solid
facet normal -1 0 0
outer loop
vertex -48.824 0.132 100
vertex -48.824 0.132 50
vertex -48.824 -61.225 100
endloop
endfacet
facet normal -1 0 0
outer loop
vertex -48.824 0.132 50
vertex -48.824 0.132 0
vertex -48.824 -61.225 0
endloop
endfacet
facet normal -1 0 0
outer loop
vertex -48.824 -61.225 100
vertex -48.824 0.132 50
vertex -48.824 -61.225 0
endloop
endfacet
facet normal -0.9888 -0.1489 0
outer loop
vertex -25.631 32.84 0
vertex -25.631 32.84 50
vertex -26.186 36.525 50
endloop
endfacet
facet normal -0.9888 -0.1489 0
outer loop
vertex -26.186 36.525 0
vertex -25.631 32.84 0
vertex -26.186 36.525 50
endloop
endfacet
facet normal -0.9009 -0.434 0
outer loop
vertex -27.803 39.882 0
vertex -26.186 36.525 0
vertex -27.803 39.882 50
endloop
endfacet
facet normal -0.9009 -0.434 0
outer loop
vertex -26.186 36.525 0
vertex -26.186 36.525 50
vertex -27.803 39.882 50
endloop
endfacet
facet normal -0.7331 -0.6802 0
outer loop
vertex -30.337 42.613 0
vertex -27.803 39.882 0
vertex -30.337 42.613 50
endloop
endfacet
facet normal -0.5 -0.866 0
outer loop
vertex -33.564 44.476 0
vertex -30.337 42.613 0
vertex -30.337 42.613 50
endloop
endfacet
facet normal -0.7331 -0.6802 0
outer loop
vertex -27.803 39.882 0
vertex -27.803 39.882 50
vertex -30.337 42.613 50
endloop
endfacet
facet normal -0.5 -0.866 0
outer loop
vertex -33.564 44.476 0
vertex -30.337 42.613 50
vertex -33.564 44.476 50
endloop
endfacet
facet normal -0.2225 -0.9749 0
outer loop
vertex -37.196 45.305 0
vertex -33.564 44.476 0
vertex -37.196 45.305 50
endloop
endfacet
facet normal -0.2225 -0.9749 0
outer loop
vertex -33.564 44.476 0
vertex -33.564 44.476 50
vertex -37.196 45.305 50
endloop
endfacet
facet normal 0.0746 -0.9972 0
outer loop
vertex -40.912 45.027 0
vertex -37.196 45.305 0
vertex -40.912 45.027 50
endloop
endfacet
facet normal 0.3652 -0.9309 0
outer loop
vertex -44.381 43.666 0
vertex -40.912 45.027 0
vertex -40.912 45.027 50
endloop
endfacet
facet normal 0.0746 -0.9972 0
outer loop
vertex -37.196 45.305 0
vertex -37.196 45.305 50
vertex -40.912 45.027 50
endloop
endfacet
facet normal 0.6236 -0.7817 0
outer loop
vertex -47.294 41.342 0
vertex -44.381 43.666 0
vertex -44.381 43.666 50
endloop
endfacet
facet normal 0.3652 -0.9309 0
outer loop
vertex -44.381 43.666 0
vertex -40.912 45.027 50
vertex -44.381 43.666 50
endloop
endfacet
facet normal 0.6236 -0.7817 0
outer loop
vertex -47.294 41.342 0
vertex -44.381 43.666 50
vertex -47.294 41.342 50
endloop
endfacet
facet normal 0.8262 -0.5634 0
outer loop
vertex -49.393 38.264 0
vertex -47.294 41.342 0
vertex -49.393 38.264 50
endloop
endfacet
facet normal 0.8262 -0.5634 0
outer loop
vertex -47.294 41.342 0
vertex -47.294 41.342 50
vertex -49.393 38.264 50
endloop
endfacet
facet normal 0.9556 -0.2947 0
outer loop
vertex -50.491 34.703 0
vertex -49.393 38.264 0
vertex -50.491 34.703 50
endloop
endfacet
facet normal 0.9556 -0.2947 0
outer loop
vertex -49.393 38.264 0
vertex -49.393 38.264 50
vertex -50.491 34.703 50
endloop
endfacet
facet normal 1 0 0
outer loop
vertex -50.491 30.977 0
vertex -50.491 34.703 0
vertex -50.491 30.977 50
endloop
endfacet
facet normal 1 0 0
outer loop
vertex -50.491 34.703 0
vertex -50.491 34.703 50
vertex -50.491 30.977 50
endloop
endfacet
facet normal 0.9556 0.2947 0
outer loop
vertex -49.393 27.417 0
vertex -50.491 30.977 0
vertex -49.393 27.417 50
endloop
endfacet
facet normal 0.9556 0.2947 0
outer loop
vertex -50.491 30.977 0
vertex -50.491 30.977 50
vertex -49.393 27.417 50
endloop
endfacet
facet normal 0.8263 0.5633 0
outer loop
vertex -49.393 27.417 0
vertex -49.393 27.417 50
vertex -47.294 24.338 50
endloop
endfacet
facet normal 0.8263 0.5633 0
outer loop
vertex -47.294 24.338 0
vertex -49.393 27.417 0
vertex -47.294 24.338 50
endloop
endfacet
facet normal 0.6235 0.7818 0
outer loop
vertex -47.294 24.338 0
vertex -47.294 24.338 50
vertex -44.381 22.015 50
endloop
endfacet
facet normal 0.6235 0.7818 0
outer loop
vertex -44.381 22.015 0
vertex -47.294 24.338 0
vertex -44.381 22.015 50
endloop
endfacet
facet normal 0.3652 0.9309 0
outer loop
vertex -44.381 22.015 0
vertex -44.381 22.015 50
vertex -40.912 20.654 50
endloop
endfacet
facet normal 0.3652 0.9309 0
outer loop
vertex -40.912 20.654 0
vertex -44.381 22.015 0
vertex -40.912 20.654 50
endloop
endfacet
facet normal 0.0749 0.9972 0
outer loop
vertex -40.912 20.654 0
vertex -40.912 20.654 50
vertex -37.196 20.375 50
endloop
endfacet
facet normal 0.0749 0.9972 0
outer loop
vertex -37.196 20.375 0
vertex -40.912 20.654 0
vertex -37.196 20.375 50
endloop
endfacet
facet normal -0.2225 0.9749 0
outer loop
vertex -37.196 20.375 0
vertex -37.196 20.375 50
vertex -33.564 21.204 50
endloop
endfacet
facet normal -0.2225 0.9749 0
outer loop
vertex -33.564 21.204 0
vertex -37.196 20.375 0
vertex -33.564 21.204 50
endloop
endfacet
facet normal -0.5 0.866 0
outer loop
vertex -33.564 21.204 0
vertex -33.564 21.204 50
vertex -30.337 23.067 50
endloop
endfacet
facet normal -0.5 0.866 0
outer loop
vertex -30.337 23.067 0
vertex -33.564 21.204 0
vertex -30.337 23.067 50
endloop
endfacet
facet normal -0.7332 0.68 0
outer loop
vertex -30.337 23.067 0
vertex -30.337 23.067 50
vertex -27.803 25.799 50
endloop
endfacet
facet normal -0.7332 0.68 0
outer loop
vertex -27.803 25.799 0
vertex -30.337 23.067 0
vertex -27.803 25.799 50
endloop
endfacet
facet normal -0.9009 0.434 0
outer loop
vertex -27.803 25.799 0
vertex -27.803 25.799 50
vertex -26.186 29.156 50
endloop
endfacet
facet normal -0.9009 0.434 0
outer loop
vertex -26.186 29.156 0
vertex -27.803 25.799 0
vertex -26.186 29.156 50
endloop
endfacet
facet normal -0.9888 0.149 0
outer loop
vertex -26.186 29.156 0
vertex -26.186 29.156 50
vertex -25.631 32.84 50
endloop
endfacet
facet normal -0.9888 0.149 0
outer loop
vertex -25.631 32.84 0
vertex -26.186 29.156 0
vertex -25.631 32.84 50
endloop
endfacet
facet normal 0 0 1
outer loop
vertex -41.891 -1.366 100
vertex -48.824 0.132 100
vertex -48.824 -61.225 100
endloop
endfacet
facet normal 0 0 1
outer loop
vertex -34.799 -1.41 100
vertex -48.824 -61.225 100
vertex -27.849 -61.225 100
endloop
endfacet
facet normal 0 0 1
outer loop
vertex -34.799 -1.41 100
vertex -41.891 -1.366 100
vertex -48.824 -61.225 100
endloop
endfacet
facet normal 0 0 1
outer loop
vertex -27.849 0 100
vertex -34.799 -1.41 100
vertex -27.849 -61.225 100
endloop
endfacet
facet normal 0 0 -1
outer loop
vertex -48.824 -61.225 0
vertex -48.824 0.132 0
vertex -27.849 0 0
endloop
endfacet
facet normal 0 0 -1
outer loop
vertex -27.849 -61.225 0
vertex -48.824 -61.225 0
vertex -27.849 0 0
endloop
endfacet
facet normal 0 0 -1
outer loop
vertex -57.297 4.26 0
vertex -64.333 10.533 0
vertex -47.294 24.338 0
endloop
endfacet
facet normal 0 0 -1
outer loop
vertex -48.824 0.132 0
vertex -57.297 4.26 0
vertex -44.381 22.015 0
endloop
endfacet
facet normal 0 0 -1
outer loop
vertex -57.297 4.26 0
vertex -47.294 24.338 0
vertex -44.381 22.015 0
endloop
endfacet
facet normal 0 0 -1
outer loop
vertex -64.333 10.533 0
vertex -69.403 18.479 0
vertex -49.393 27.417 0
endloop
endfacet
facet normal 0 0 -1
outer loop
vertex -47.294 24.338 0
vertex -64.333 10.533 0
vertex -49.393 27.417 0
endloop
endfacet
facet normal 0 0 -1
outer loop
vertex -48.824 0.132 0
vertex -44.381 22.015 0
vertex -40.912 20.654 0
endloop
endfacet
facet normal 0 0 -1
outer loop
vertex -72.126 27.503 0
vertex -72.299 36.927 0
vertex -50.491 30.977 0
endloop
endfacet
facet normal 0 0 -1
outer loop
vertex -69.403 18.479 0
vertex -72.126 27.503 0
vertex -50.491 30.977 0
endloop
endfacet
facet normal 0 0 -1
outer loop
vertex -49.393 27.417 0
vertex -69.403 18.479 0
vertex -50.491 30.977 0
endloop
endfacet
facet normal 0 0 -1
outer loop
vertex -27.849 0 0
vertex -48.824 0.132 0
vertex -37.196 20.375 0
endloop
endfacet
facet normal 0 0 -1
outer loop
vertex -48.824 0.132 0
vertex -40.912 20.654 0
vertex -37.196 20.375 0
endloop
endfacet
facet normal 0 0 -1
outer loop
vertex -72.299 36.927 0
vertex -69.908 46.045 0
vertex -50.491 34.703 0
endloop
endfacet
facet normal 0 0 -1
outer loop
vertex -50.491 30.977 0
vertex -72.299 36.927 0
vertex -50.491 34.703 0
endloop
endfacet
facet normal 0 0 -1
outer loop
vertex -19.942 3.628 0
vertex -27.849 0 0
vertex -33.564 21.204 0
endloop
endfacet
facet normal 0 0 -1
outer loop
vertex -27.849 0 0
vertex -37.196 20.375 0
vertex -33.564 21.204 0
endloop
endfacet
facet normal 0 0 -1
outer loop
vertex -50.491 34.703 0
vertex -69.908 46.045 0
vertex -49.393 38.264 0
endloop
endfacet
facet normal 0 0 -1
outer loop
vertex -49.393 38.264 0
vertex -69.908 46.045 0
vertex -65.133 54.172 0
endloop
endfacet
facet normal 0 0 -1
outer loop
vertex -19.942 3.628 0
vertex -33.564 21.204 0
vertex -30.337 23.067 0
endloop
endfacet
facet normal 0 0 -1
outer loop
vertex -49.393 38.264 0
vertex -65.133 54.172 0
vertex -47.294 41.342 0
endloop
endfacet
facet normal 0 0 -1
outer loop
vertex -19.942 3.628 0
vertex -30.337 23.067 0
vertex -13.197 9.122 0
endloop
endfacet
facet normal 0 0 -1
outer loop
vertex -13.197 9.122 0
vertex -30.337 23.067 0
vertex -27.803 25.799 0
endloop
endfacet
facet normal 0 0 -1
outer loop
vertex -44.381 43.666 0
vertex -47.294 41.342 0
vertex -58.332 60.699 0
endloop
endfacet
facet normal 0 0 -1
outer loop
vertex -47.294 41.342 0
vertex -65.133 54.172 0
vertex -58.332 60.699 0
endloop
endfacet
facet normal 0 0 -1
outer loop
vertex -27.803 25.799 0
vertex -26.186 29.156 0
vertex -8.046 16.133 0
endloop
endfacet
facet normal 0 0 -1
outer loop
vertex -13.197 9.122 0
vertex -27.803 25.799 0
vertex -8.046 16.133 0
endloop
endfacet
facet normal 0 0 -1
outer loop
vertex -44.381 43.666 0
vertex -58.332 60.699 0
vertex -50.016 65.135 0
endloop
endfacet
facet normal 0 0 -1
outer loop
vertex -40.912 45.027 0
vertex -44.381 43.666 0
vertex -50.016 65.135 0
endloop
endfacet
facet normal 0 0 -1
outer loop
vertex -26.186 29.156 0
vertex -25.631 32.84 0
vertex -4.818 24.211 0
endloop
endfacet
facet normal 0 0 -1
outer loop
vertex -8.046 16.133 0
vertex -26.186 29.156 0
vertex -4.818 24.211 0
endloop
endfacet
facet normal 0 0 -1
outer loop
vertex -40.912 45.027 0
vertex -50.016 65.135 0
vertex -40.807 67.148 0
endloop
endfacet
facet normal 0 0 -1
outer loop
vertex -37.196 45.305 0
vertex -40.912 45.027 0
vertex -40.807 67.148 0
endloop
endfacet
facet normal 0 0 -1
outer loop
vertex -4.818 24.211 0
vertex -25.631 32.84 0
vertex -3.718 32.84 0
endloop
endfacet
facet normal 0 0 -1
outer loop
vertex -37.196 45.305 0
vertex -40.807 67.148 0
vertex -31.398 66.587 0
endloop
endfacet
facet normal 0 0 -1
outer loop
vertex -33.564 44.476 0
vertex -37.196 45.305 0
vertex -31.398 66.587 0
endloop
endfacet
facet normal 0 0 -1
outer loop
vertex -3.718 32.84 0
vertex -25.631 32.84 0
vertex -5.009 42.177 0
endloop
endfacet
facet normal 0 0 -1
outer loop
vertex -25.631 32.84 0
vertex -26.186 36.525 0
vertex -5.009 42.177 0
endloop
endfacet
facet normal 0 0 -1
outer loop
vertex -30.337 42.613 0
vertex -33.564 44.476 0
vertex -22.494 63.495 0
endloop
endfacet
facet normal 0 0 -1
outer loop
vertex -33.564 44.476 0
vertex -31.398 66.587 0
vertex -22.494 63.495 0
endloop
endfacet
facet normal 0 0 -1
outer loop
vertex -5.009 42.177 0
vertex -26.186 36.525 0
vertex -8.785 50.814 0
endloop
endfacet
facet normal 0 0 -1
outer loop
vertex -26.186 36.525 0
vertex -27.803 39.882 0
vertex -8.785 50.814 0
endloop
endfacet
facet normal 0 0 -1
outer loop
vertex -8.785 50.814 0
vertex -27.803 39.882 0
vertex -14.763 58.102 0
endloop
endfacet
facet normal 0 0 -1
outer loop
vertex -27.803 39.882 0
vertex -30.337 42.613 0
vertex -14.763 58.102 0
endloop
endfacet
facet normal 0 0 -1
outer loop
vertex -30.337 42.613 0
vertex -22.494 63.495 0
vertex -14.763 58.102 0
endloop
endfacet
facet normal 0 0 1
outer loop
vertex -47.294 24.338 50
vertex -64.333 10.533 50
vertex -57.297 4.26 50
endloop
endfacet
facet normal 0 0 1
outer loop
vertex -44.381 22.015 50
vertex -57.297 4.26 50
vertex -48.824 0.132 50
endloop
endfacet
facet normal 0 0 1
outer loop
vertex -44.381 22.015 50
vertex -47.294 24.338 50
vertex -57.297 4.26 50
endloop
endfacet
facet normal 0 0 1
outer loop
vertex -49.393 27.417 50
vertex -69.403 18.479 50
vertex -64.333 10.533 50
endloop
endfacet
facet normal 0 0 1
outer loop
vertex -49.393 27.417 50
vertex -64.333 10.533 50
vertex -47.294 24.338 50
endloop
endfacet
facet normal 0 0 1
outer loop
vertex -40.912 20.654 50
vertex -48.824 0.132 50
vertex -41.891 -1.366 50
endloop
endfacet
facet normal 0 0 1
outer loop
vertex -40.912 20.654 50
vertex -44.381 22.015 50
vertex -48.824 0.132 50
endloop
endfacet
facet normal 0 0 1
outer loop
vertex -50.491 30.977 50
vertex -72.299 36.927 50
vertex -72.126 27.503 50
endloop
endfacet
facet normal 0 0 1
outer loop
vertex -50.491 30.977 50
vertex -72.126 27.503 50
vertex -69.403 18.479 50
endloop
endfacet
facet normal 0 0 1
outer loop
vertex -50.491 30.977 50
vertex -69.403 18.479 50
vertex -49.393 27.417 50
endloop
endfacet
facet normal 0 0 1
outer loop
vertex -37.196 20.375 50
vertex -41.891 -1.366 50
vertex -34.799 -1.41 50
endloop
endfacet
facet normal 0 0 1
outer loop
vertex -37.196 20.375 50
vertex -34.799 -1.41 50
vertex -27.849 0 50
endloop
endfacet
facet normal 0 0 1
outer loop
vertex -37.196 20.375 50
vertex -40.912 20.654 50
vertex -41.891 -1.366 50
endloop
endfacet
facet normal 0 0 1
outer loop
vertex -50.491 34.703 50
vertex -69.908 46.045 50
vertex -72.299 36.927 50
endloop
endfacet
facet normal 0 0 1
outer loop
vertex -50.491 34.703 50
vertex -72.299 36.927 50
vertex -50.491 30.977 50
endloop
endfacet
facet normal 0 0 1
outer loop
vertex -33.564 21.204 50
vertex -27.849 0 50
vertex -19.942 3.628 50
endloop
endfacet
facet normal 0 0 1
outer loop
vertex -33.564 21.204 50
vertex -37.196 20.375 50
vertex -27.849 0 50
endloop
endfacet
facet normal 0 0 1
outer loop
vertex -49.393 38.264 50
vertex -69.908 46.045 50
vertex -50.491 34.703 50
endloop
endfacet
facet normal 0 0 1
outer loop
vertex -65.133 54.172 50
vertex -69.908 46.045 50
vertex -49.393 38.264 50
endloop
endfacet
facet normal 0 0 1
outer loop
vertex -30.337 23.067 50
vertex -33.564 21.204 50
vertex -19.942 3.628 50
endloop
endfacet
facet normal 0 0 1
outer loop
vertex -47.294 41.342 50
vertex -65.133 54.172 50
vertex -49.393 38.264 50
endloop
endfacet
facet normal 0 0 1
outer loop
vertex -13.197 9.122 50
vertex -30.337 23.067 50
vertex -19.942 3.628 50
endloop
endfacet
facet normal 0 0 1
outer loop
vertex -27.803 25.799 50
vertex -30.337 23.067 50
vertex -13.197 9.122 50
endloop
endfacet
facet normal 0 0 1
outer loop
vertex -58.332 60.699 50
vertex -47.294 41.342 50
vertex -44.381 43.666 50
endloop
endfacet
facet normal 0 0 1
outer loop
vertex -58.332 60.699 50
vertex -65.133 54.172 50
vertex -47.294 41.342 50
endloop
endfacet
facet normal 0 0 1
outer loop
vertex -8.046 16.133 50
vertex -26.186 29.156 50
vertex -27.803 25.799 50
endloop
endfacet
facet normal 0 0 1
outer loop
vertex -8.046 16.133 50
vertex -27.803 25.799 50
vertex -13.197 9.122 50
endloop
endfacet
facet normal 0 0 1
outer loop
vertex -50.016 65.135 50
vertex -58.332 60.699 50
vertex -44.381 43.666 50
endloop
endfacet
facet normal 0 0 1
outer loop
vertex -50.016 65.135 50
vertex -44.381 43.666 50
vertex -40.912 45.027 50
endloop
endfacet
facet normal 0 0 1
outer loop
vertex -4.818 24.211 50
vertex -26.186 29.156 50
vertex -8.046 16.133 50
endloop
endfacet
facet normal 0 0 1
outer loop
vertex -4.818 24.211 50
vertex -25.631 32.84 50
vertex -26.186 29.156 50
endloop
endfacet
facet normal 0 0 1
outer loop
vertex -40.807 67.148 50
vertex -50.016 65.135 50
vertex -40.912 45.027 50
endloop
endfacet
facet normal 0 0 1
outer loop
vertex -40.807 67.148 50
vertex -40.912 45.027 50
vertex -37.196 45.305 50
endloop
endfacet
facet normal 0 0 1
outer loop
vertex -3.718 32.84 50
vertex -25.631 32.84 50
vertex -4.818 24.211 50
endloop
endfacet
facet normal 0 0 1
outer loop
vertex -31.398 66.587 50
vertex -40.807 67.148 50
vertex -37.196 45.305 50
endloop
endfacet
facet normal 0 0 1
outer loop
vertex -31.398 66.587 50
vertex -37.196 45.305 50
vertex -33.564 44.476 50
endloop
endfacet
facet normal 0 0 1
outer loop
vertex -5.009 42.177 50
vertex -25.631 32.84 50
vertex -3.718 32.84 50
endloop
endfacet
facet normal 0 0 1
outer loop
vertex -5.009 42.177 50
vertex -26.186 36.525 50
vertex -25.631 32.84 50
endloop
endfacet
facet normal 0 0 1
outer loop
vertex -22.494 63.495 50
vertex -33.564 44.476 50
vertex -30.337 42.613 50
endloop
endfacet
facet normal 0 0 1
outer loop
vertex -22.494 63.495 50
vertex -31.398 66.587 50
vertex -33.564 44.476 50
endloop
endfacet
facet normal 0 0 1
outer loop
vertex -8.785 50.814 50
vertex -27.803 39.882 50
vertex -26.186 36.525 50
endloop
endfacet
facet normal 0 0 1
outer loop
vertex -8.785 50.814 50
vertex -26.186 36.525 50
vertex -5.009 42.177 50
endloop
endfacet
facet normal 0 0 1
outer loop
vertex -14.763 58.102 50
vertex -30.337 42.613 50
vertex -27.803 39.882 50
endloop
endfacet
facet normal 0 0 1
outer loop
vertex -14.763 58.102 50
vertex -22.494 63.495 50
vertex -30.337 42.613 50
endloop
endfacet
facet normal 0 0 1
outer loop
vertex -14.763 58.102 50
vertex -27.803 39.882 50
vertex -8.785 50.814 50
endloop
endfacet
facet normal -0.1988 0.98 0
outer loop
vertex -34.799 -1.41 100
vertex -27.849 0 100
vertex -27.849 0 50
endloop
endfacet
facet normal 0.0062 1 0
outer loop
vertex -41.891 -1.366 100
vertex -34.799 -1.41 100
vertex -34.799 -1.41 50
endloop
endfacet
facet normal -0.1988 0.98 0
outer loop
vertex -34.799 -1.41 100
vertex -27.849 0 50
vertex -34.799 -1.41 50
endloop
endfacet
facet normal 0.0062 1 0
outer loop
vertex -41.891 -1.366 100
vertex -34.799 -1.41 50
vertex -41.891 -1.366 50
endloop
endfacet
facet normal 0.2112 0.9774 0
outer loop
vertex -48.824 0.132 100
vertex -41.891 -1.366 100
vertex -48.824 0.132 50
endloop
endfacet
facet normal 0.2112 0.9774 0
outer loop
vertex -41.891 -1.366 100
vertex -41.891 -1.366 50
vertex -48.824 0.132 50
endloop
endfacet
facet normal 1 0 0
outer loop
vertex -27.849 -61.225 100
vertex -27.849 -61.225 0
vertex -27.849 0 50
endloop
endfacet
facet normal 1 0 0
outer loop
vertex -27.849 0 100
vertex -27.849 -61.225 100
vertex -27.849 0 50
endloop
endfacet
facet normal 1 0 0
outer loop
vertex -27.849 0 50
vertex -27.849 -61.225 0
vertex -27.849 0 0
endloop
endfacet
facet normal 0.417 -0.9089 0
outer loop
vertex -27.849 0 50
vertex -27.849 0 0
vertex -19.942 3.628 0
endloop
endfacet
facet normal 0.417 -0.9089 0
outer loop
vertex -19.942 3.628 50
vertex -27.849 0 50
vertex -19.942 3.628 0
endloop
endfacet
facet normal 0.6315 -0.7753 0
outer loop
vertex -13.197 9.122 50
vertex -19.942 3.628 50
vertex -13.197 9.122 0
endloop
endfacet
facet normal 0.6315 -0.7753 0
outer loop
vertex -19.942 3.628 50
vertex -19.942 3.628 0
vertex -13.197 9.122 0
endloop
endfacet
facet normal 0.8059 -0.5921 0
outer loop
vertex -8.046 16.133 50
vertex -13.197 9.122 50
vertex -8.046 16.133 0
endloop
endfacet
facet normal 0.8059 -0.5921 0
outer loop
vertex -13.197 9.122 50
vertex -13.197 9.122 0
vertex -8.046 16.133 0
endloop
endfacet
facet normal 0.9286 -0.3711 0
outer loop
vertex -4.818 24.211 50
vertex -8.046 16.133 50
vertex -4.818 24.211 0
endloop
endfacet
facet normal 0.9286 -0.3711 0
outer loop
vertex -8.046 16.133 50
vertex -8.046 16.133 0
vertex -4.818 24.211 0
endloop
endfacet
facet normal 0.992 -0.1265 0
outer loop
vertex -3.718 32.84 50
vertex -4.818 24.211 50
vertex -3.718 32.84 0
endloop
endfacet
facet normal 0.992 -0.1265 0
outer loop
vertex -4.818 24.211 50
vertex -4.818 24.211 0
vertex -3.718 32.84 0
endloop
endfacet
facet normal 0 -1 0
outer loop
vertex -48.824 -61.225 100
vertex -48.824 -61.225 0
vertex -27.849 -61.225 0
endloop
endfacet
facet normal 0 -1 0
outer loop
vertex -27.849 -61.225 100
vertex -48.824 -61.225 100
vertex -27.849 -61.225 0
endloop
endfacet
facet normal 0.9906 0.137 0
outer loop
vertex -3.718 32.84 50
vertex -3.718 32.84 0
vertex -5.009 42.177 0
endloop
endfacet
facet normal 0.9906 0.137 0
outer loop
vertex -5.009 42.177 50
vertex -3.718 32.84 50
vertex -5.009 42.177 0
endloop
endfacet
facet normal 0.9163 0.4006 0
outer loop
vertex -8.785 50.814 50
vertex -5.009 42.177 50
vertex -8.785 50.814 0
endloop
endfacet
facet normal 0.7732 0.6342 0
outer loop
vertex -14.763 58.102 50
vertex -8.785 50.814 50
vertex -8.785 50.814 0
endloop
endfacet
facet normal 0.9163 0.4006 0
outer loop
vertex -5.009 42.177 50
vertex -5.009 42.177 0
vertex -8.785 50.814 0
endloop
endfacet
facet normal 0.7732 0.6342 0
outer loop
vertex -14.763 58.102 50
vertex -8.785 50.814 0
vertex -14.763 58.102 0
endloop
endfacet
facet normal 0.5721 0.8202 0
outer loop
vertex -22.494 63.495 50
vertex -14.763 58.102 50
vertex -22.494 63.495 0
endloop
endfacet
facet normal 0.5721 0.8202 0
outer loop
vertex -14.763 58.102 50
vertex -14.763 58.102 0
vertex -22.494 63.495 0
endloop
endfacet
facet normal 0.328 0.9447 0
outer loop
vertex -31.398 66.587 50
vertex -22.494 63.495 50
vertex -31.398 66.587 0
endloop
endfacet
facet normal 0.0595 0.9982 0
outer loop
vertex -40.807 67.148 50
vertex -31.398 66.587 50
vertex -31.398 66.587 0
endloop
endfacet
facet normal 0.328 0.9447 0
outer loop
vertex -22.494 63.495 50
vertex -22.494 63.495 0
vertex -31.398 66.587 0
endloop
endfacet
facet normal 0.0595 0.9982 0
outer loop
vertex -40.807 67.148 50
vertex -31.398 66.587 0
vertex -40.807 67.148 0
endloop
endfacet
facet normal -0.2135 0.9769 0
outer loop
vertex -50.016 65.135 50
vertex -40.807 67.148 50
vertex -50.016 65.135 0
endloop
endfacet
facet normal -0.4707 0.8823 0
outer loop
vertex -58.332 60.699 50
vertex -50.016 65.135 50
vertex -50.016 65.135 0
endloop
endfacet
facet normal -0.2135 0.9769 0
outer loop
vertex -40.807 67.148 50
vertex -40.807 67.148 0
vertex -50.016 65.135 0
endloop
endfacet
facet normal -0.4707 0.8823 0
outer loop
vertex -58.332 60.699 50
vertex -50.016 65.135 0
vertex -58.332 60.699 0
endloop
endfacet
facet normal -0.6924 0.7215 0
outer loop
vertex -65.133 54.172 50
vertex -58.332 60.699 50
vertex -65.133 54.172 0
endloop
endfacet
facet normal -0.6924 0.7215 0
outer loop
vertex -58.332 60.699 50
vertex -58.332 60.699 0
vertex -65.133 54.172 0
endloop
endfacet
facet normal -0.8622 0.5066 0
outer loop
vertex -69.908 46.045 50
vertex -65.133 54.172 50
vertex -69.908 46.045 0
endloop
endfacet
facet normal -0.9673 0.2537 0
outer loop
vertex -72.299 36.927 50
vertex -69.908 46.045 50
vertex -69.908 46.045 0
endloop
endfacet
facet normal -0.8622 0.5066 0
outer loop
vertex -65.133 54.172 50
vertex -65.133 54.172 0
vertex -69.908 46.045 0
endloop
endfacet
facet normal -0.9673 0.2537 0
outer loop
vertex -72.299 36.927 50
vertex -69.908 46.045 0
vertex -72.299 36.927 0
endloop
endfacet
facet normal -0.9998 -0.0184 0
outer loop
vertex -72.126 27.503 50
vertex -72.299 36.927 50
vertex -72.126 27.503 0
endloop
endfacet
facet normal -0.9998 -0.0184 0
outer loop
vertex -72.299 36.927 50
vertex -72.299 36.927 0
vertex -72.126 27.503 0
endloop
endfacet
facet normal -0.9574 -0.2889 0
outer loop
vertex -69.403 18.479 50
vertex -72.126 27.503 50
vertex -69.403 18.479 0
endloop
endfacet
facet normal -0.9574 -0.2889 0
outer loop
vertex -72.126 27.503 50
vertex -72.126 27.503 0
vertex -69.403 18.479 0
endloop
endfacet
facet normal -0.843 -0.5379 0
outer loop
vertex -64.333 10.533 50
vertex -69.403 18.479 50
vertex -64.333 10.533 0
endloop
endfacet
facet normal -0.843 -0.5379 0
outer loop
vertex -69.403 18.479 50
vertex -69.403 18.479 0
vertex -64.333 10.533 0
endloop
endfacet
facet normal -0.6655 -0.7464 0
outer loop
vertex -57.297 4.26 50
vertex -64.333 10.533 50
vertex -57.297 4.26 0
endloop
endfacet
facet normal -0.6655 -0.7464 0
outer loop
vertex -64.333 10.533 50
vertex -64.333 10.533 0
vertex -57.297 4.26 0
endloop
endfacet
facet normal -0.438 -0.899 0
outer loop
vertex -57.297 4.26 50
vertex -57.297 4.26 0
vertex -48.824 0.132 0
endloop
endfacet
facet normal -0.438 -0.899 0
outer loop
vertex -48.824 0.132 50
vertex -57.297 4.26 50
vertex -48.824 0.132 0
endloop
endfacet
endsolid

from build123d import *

# Parameters (mm, degrees)
F1_DEPTH = 50
F2_DEPTH = 100
F3_R     = 12.5
F4_DEPTH = 100


with BuildPart() as f1:
    # F0 (on Top) → F1 (new body)
    with BuildSketch(Plane.XY):
        with BuildLine():
            ThreePointArc((-27.848724, 0), (-10.399488, 12.464069), (-3.718301, 32.840295))
            ThreePointArc((-3.718301, 32.840295), (-58.332346, 60.698612), (-48.823562, 0.131601))
            ThreePointArc((-48.823562, 0.131601), (-38.346414, -1.571236), (-27.848724, 0))
        make_face()
    extrude(amount=F1_DEPTH)

    # F0 (on Top) → F2 (join)
    with BuildSketch(Plane.XY):
        with BuildLine():
            ThreePointArc((-27.848724, 0), (-38.346414, -1.571236), (-48.823562, 0.131601))
            Line((-48.823562, 0.131601), (-48.823562, -61.224833))
            Line((-48.823562, -61.224833), (-27.848724, -61.224833))
            Line((-27.848724, -61.224833), (-27.848724, 0))
        make_face()
    extrude(amount=F2_DEPTH)

    # F3 (on face) → F4 (cut)
    with BuildSketch(Plane.XY.offset(50)):
        with Locations((-38.130508, 32.840295)):
            Circle(F3_R)
    extrude(amount=-F4_DEPTH, mode=Mode.SUBTRACT)


solid = f1.part
